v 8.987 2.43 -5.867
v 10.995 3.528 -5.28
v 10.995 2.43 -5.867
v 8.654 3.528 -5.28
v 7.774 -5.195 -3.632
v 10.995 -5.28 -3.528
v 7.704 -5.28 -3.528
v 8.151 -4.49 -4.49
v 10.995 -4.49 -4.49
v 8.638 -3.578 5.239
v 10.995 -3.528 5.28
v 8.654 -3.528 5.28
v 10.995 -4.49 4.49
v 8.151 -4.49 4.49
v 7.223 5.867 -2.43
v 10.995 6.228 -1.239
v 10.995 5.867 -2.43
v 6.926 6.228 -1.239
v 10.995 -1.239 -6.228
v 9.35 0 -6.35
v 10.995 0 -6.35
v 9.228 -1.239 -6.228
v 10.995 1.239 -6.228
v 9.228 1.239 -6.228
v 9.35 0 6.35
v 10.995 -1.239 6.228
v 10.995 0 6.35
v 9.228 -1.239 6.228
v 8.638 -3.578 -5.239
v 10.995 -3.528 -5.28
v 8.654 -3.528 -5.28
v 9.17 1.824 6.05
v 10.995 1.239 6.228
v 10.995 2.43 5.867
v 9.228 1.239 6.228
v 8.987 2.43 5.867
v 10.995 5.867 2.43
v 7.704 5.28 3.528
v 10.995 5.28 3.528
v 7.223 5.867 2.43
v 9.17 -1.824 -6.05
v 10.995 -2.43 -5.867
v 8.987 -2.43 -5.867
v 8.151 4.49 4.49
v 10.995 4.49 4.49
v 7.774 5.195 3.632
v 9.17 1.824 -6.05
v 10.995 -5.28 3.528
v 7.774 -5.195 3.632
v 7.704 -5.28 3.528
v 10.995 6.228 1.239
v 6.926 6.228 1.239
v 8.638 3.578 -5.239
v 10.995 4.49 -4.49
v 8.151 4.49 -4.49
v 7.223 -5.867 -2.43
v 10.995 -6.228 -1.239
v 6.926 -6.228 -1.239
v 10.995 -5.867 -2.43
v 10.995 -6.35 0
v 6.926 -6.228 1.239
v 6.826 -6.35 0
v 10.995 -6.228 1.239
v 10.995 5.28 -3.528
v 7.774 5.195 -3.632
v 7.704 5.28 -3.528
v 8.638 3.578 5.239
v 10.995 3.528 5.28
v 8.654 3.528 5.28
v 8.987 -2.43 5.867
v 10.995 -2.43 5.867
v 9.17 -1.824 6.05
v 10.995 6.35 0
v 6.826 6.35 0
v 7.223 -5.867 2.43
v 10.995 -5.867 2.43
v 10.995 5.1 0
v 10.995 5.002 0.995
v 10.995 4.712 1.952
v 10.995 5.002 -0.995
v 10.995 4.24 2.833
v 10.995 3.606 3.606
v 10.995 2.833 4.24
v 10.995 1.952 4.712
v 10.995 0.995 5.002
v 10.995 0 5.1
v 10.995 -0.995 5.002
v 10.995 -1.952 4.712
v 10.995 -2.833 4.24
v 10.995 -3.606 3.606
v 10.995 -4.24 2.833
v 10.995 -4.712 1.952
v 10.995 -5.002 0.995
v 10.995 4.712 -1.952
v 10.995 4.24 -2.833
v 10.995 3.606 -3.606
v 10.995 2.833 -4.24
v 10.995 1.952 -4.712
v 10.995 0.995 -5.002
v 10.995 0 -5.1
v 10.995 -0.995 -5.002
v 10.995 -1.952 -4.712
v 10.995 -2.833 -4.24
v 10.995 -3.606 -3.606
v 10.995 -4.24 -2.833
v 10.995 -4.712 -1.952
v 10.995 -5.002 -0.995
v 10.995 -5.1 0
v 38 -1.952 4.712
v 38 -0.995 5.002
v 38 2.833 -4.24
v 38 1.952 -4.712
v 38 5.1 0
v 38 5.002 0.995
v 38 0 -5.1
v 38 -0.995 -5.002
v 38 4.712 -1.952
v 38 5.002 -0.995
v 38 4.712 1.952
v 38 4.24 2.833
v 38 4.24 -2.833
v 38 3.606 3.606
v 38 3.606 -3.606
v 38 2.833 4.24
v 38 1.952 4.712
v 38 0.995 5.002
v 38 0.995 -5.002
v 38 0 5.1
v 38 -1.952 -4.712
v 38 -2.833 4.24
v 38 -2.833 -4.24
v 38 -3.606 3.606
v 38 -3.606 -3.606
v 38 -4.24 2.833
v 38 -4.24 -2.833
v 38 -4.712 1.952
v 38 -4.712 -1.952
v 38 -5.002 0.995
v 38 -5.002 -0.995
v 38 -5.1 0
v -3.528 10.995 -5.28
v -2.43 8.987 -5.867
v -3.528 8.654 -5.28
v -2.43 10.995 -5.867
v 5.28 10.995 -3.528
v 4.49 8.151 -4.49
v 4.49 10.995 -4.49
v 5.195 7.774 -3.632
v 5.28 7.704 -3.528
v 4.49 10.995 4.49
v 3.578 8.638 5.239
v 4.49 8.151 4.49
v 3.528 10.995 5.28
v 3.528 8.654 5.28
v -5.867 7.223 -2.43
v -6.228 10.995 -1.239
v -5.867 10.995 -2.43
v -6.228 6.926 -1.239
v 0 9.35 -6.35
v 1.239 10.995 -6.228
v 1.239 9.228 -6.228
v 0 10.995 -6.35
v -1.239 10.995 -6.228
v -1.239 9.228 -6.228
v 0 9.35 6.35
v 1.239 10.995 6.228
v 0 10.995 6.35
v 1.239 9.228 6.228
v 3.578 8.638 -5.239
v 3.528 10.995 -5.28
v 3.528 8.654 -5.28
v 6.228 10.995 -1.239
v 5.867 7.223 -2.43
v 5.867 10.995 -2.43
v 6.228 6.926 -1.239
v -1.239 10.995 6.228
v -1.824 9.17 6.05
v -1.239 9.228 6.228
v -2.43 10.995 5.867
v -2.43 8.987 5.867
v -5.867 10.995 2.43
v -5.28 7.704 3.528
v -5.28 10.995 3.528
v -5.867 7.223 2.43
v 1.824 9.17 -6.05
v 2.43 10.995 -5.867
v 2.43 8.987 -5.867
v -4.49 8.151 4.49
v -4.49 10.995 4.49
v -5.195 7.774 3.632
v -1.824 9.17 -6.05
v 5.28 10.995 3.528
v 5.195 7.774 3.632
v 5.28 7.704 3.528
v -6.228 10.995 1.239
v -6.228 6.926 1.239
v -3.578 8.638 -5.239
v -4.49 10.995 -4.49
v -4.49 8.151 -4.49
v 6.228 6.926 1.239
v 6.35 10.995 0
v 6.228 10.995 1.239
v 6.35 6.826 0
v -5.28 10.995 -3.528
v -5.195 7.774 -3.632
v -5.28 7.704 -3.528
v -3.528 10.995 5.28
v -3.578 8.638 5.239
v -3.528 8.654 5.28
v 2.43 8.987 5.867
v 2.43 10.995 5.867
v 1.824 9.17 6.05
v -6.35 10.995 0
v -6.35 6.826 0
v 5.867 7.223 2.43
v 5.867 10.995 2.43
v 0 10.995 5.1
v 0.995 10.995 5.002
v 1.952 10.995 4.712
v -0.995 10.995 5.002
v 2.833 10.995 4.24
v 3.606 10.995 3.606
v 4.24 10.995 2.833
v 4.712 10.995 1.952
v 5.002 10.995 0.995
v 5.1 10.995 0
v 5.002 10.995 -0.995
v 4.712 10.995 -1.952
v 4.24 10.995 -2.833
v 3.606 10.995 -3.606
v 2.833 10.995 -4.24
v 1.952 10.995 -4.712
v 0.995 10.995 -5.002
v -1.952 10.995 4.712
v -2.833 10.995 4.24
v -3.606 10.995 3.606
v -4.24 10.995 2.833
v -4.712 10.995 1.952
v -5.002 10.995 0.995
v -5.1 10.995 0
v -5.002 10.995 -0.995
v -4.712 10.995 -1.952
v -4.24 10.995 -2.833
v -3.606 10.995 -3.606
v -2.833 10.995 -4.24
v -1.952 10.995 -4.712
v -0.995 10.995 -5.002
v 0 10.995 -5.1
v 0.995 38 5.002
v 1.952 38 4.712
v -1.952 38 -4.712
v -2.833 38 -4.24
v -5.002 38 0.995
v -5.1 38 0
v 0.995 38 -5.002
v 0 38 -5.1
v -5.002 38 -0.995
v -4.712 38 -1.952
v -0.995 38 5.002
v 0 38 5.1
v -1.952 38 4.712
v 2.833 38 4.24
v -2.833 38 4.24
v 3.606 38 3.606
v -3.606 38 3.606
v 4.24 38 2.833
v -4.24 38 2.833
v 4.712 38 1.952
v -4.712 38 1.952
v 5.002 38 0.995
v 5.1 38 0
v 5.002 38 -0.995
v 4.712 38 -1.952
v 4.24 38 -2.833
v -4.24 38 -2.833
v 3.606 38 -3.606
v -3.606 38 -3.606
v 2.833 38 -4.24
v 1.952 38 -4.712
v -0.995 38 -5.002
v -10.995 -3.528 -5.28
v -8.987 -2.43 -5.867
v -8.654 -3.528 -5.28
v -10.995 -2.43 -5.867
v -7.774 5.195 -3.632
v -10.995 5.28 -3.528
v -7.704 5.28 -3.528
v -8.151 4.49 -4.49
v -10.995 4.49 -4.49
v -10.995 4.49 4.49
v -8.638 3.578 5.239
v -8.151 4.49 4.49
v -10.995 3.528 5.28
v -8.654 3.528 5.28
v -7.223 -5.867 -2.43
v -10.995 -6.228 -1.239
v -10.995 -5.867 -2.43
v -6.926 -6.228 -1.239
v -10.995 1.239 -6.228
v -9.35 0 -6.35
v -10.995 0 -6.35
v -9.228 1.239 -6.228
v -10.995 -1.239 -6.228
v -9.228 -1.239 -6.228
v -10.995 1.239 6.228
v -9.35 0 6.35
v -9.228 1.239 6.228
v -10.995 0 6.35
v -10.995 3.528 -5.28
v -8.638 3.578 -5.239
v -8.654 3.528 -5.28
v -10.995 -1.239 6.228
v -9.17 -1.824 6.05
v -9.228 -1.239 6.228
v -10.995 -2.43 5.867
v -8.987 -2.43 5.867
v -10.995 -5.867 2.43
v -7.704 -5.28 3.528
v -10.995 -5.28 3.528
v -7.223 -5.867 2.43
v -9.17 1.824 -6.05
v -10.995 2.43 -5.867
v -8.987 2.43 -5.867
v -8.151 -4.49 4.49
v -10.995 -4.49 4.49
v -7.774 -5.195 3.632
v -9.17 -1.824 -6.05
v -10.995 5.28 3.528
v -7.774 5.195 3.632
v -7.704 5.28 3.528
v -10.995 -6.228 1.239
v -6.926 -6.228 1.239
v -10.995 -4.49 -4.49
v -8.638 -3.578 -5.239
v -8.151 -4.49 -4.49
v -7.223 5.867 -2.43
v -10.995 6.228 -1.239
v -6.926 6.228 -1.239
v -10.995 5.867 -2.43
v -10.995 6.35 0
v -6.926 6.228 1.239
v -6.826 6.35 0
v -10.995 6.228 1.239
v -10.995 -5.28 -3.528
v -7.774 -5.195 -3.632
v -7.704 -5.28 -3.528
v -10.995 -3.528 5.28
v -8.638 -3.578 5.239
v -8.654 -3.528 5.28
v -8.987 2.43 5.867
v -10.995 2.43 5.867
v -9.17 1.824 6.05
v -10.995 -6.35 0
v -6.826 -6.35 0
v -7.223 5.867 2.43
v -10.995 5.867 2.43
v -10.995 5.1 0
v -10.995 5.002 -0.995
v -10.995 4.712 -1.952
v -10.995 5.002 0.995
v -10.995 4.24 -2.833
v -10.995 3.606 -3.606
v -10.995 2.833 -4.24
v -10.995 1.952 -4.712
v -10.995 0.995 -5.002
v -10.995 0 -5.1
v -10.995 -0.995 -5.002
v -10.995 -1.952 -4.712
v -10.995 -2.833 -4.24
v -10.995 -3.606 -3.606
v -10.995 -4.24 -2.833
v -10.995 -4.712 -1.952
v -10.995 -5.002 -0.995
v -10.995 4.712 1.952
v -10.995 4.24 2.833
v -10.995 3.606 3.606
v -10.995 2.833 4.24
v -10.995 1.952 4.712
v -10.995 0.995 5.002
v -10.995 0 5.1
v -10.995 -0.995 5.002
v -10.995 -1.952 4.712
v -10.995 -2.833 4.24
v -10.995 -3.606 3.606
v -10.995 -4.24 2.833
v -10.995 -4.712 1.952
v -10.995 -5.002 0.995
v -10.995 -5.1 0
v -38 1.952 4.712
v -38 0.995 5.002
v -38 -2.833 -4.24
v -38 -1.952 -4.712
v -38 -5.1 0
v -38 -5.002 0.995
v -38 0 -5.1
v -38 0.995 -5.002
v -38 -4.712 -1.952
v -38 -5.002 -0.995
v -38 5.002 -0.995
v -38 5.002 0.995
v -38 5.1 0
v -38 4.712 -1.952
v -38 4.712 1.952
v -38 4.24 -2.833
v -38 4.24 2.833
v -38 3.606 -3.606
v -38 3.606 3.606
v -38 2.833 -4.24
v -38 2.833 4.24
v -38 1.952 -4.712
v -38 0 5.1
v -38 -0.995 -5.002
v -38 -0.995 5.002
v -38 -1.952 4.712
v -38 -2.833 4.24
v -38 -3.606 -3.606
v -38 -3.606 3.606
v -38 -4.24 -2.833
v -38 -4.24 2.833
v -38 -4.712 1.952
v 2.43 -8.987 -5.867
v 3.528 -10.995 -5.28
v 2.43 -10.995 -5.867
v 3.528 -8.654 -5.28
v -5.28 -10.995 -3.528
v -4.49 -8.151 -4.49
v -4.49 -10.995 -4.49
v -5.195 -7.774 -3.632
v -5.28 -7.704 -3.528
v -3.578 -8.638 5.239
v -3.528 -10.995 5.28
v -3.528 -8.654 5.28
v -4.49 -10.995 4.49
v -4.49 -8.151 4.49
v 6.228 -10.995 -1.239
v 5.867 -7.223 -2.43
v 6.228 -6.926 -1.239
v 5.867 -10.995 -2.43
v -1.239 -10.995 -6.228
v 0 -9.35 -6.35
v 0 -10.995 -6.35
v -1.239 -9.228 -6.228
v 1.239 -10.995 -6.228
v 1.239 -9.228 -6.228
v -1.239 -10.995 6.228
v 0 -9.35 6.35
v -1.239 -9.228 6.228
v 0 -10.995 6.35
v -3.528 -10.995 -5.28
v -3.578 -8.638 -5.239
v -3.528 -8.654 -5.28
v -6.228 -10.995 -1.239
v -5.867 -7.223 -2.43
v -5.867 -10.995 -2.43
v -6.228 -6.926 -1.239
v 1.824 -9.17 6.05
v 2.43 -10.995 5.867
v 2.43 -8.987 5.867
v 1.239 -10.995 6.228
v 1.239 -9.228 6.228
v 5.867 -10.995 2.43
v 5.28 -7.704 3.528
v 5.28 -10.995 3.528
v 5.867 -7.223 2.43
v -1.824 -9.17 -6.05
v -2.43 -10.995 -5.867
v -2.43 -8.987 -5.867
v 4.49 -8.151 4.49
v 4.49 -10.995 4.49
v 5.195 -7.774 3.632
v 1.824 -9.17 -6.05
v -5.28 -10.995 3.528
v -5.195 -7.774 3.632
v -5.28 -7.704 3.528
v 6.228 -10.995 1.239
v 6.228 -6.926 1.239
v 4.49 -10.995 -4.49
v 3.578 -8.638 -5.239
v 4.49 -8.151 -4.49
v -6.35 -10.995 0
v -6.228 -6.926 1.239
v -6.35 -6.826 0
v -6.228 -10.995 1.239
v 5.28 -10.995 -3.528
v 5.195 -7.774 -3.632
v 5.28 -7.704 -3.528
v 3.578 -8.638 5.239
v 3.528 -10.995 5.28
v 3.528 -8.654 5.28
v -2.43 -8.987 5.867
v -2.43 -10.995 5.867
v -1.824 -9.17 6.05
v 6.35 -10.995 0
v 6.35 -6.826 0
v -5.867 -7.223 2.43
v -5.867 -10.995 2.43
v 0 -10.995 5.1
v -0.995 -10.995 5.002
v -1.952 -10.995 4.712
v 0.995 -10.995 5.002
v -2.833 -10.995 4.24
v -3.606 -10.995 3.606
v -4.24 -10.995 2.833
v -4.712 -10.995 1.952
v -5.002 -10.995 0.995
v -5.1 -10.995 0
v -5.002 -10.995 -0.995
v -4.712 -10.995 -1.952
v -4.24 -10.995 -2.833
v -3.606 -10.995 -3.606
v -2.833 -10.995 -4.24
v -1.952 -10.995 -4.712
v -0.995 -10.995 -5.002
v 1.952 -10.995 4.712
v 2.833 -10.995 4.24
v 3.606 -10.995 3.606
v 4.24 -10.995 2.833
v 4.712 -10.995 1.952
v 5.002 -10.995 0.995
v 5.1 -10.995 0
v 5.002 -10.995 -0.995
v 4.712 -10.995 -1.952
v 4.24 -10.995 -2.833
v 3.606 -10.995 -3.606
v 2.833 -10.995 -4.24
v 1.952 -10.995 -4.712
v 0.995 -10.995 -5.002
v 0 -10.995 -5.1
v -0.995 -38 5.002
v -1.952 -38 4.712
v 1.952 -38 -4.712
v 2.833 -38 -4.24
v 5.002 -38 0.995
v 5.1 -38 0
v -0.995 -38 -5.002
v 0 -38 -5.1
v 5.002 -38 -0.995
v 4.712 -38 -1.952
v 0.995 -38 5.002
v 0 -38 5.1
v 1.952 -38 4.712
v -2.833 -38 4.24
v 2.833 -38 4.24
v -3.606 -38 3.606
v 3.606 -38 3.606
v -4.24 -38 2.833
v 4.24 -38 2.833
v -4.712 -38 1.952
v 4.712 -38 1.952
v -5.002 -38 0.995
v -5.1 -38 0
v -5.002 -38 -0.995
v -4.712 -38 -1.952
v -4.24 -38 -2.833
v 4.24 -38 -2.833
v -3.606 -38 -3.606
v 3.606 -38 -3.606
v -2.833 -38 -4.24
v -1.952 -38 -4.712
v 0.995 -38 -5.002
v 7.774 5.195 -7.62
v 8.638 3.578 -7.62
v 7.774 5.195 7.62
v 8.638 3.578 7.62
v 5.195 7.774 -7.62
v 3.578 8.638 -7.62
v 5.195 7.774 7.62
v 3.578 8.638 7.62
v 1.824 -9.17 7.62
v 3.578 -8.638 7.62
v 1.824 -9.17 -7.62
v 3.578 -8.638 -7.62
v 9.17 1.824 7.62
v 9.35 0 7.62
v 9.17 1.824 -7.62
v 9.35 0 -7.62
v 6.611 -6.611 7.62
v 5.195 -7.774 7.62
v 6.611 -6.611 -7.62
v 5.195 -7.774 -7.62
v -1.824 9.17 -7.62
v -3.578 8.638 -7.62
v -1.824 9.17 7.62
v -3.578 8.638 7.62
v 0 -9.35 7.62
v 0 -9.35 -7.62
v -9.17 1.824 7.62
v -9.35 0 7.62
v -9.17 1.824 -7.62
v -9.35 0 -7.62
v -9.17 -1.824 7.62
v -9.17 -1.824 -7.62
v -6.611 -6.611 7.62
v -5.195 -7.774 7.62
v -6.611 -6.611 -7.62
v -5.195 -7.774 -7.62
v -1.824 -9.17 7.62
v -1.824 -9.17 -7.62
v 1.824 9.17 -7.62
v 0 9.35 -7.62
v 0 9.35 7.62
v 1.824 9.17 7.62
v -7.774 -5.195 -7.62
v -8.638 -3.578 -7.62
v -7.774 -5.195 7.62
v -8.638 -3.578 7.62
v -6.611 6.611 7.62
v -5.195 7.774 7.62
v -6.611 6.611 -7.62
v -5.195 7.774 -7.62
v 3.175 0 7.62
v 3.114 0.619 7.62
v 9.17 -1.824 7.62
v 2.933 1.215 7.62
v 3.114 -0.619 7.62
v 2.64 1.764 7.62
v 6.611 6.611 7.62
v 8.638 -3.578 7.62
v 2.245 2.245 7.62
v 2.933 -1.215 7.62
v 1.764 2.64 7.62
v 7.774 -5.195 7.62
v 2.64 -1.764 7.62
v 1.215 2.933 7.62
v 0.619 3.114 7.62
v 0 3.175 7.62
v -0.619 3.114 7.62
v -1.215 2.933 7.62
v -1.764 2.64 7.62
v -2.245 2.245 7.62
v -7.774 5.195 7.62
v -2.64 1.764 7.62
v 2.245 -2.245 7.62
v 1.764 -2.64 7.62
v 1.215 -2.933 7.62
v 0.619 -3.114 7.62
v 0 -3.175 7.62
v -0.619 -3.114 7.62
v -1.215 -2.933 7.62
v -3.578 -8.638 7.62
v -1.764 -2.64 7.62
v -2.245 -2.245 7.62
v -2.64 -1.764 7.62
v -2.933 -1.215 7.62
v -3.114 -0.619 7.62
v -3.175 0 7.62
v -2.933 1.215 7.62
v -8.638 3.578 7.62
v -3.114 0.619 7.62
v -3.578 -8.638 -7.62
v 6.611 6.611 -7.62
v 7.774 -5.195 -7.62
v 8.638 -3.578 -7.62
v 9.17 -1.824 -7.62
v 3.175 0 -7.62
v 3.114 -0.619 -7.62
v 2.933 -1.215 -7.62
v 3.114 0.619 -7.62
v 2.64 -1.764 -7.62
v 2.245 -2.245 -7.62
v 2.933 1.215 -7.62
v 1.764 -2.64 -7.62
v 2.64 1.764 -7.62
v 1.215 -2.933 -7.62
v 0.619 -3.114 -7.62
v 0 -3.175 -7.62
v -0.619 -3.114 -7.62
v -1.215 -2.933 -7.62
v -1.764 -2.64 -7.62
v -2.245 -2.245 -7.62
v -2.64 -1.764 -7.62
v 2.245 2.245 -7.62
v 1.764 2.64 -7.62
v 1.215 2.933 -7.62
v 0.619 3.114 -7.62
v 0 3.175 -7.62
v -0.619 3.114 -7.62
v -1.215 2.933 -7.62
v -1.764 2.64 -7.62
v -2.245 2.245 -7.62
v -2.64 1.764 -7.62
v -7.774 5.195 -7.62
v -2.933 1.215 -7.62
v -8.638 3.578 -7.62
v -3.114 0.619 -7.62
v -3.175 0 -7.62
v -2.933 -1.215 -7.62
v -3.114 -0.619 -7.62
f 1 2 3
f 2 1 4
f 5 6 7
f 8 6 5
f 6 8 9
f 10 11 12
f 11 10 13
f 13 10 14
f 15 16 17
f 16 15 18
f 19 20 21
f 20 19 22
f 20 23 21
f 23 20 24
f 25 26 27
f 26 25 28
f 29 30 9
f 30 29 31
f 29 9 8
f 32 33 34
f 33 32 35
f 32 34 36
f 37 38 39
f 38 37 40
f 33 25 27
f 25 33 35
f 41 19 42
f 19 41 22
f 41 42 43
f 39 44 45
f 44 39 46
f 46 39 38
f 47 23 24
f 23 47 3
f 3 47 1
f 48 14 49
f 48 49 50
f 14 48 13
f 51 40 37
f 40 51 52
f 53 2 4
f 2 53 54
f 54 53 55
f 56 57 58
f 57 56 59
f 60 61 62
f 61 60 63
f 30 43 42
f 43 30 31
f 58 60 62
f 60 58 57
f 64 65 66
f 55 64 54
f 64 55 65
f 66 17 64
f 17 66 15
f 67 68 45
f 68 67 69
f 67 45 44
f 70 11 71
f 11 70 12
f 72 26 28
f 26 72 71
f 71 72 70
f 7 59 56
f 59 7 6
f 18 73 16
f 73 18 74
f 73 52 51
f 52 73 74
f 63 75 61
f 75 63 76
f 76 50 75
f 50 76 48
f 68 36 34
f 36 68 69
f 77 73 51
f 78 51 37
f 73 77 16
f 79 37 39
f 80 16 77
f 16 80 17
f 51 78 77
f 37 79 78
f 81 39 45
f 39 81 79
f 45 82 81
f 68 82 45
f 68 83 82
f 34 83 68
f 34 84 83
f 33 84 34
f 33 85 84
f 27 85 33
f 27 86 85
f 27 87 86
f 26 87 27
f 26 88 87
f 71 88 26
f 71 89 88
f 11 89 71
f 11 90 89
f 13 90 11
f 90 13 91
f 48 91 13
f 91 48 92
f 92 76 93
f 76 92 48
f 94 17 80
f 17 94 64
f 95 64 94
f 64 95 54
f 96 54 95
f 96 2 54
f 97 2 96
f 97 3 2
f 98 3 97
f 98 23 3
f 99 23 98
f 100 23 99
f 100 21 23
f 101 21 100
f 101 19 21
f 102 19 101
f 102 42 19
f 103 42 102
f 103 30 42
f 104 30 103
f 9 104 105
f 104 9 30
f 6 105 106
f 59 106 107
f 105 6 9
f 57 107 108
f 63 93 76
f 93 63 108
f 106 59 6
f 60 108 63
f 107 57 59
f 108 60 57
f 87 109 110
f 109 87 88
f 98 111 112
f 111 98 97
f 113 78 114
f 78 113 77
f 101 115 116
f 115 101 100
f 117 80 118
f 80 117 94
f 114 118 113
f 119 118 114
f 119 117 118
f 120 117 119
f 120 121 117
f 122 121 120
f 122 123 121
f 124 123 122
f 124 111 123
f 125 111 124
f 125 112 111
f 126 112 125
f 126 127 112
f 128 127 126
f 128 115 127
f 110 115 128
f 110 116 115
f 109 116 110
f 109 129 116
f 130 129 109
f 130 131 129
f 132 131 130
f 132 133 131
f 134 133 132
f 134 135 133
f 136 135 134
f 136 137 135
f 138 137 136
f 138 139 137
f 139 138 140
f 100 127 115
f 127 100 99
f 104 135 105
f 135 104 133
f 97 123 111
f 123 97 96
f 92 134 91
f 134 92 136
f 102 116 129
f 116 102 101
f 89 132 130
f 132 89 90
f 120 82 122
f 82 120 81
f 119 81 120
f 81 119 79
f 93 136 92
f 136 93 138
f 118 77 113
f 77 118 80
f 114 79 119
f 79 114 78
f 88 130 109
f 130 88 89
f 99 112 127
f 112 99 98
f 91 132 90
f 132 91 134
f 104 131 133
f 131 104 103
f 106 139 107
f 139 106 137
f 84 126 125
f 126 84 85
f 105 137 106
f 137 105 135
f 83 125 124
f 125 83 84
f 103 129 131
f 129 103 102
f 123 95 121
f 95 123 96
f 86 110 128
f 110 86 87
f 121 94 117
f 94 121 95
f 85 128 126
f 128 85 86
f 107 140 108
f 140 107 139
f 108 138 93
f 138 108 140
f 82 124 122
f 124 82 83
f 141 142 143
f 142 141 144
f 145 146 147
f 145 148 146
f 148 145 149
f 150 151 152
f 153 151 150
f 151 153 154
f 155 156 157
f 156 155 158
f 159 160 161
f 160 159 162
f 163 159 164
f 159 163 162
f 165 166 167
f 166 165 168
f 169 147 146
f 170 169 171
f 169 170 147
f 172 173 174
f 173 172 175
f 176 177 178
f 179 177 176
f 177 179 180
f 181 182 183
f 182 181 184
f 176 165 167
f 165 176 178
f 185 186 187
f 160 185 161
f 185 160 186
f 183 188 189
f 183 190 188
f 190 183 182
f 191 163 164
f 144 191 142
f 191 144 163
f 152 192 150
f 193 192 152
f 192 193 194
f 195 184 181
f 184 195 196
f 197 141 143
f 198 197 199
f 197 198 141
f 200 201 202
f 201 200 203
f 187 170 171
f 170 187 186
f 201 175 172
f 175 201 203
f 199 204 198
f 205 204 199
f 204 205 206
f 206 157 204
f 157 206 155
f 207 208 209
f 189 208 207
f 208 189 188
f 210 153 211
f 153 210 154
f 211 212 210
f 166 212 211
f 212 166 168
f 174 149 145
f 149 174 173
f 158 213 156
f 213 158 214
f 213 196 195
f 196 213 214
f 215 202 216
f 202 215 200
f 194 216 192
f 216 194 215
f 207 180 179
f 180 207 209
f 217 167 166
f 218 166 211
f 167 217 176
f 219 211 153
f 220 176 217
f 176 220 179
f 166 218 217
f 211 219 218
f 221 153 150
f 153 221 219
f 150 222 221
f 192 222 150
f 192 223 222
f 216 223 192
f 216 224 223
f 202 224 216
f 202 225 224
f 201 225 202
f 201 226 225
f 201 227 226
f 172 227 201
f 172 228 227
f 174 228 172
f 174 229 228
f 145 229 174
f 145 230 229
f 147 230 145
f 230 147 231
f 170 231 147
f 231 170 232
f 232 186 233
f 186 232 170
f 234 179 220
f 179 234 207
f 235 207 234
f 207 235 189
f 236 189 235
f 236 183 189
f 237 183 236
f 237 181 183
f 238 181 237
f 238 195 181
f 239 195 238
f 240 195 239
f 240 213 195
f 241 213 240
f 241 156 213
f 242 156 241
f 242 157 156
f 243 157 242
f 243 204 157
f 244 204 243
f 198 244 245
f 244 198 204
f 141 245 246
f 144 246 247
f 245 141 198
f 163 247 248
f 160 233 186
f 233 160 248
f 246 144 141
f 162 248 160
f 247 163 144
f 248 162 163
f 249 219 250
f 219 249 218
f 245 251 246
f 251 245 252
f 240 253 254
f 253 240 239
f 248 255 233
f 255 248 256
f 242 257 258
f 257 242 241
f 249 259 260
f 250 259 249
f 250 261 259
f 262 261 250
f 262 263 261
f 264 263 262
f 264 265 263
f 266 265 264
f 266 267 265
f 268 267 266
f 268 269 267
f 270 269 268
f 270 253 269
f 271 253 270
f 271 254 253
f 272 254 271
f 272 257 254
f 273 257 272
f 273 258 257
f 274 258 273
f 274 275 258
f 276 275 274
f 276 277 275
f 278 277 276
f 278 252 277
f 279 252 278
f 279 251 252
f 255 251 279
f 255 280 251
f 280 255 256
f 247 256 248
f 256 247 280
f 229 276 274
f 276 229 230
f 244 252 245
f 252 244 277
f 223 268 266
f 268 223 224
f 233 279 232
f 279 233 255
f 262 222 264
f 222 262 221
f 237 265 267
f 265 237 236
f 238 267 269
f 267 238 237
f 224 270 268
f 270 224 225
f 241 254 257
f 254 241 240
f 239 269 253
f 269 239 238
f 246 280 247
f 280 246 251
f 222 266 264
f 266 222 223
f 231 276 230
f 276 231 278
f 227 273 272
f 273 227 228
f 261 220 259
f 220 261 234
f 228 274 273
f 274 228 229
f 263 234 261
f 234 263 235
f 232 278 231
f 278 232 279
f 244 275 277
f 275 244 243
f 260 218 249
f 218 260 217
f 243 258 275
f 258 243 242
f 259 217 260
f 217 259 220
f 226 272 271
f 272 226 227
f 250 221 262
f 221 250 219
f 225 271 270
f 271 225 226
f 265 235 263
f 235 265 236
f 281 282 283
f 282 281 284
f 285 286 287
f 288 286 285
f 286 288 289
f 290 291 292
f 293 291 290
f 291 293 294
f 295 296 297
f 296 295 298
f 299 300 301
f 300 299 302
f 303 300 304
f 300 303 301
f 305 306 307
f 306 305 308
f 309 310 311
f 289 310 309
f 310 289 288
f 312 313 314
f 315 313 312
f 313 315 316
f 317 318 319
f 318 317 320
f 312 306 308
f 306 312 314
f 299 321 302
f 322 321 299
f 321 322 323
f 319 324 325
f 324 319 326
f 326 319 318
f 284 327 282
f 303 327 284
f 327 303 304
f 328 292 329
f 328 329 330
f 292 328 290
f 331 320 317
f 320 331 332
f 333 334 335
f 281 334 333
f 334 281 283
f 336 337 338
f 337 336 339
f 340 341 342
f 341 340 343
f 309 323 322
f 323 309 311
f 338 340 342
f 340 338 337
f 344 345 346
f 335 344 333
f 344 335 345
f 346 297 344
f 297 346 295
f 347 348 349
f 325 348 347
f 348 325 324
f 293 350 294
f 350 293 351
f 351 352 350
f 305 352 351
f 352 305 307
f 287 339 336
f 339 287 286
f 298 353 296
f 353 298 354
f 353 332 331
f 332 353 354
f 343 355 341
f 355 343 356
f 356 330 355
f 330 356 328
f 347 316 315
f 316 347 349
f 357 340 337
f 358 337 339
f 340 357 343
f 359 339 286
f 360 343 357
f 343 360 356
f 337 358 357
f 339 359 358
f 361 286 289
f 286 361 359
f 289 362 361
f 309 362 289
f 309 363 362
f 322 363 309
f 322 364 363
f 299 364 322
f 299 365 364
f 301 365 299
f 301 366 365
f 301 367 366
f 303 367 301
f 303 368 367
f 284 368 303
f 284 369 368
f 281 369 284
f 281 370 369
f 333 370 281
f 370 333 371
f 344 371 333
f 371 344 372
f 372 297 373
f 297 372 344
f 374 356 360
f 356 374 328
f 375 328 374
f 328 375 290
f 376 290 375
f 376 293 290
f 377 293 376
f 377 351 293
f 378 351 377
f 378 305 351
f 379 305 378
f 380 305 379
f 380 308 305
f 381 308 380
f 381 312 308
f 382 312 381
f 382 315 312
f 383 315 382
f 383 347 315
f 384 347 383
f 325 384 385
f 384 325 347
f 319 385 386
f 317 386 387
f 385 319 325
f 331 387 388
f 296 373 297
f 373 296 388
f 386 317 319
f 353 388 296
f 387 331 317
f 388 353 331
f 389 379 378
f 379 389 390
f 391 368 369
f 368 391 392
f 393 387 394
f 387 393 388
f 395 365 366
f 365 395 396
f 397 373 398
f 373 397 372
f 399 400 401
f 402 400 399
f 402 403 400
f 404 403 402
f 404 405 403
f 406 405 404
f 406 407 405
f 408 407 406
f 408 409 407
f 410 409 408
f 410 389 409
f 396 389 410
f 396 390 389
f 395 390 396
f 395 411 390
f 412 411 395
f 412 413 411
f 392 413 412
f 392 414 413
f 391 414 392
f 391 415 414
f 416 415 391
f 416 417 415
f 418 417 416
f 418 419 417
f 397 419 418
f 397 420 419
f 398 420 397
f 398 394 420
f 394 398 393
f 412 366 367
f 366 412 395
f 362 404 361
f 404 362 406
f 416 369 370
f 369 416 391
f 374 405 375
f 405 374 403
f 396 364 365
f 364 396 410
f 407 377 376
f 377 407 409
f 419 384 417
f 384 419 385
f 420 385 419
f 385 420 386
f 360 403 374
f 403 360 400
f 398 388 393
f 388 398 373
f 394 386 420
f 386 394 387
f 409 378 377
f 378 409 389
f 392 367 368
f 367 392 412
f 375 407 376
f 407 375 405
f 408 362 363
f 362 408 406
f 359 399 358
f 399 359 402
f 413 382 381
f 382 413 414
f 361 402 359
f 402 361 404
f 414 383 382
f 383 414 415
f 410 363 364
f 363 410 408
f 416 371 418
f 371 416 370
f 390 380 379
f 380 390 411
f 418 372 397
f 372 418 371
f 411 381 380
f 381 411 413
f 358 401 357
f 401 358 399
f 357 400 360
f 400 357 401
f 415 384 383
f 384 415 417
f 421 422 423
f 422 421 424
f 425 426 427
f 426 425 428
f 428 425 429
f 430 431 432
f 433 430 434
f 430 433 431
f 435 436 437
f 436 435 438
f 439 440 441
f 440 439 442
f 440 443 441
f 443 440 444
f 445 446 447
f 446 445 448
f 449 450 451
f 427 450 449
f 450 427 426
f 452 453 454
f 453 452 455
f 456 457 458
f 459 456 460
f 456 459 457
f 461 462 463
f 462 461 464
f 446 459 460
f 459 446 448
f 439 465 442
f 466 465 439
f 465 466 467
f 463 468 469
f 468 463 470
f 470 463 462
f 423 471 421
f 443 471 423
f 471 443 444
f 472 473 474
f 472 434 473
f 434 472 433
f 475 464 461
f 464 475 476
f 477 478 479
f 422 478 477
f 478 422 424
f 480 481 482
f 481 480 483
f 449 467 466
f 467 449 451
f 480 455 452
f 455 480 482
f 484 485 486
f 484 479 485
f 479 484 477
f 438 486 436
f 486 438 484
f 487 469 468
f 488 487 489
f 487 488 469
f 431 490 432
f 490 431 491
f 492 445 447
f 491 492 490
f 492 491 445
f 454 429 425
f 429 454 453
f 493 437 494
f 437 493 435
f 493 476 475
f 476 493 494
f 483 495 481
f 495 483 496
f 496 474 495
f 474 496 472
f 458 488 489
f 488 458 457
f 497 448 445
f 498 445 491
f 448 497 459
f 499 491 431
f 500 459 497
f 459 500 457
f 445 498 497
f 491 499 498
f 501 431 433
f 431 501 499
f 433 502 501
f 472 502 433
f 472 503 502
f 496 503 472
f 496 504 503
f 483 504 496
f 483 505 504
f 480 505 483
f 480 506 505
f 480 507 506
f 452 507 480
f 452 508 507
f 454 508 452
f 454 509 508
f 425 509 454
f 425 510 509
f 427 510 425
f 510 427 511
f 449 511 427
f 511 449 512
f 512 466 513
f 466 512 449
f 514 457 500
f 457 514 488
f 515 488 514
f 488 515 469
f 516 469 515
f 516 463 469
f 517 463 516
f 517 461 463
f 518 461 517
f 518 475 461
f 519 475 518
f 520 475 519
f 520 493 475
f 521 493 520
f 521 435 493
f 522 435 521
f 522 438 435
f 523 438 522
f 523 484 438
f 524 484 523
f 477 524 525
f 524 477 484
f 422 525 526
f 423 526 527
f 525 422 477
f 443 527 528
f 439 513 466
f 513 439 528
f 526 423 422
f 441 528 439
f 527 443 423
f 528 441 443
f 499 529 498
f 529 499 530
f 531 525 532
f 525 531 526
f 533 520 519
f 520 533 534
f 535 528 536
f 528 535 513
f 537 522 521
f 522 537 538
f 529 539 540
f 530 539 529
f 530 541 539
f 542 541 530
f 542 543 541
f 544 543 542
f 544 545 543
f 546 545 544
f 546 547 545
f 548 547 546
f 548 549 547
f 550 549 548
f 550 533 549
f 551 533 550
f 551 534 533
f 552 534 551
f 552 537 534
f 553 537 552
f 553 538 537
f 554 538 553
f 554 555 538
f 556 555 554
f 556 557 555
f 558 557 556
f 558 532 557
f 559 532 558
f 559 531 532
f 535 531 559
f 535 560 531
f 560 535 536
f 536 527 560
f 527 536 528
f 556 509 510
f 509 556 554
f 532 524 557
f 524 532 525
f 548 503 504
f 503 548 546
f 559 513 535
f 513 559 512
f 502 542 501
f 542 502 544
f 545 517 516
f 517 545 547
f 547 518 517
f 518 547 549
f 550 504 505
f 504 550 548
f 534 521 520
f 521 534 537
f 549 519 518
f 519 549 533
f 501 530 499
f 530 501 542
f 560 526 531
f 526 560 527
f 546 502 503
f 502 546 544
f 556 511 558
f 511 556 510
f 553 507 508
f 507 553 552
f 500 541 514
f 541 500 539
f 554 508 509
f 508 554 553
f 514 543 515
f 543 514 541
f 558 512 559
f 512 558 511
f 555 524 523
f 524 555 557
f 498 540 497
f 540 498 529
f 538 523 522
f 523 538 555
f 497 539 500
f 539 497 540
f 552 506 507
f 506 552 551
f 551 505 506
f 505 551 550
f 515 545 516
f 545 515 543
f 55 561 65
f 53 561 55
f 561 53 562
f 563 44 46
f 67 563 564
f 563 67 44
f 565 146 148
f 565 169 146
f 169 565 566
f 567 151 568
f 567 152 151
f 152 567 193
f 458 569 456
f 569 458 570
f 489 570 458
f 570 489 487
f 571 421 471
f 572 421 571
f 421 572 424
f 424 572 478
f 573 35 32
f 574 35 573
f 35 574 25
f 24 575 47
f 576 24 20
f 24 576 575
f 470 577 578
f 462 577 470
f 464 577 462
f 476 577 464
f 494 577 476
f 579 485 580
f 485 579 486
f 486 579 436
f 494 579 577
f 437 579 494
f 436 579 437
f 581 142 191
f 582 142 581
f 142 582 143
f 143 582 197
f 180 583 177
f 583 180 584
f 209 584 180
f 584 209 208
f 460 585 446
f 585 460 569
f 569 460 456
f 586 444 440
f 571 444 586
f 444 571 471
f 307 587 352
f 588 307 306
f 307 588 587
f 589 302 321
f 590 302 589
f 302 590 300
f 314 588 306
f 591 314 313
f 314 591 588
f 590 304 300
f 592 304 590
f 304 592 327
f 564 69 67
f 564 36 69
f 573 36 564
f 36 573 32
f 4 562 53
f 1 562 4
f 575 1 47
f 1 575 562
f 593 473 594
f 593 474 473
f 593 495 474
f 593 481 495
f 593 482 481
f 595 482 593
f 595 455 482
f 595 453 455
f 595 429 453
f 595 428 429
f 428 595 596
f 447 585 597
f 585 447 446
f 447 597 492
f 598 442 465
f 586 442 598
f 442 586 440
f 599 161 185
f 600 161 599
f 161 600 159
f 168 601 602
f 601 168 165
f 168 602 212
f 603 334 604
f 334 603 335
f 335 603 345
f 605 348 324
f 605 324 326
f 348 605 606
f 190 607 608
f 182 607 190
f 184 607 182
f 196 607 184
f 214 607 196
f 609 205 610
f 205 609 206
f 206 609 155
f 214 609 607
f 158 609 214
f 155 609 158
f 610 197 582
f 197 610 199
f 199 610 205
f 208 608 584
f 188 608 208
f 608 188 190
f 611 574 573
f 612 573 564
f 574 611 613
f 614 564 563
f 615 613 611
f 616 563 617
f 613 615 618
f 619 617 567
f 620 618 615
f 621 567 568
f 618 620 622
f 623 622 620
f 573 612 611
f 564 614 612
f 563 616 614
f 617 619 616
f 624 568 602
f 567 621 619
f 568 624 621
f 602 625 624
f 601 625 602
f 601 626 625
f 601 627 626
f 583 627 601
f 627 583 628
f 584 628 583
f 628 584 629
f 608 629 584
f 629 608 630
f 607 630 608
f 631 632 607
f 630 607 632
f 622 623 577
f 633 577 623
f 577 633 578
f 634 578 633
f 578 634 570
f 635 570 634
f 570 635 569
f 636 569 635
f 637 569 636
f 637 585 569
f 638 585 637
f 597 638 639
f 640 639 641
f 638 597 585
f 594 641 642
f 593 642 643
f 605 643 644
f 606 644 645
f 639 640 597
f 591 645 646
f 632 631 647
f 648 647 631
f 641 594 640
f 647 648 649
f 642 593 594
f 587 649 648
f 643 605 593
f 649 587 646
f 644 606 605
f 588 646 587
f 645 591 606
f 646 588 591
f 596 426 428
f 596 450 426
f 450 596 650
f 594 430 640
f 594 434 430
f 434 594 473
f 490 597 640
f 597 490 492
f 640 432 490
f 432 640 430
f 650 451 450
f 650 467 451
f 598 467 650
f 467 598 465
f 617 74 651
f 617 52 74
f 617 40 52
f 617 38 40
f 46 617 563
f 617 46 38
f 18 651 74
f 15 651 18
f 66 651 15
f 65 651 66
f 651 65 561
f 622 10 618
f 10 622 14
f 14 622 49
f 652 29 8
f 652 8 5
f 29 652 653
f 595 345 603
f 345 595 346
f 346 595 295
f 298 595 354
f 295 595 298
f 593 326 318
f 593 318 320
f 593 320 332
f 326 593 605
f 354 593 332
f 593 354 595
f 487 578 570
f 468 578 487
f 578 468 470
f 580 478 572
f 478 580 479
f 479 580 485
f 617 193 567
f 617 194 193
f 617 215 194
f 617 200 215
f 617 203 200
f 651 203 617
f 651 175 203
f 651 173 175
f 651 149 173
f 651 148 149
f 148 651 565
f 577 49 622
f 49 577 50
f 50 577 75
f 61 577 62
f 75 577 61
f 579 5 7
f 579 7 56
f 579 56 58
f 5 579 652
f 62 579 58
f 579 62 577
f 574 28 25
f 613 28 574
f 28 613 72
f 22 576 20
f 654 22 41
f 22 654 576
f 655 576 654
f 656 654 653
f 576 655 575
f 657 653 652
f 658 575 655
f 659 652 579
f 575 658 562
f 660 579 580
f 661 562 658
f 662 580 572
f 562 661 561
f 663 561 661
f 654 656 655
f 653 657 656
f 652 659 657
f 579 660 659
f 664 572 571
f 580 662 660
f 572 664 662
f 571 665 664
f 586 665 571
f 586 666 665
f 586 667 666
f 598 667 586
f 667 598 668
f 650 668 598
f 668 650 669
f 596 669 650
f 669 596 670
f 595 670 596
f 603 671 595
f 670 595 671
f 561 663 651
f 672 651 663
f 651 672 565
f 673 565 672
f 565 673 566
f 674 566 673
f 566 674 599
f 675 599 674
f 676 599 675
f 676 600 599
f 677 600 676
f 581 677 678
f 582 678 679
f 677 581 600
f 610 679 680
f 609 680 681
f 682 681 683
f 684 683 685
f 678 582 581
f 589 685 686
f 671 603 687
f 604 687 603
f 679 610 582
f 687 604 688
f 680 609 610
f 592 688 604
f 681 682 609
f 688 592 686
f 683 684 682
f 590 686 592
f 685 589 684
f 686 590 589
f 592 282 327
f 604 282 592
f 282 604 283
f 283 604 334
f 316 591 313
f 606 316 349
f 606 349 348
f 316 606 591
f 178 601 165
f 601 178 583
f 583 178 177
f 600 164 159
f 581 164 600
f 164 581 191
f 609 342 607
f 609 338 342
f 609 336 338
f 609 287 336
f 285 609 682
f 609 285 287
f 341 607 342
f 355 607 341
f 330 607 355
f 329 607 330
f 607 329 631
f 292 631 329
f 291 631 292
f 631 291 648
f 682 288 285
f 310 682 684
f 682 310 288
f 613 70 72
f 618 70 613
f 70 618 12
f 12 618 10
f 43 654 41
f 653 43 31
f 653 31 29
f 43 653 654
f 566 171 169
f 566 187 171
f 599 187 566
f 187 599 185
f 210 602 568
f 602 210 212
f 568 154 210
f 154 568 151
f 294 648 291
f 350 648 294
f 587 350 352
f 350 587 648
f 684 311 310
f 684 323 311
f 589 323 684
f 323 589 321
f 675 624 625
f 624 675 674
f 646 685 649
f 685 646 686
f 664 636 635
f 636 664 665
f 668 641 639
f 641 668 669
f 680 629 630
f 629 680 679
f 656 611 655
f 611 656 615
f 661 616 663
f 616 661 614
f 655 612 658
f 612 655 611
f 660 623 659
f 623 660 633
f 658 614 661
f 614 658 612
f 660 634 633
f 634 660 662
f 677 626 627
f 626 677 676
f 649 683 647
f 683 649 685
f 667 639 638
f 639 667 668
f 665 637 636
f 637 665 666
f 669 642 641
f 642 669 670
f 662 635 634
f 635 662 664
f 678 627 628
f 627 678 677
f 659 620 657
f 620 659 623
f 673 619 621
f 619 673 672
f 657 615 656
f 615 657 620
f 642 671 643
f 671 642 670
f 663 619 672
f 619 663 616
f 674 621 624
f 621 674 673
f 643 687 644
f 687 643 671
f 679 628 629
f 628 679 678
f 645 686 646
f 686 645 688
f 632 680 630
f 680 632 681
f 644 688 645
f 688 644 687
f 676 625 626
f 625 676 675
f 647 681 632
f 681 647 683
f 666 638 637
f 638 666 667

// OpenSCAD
$fn = 32;

// ----------------------------------------------------------------------
// Cardan cross: 76 mm span, 12.7 mm trunnions
// ----------------------------------------------------------------------

// --- parameters (mm) ---
journal_d = 12.7;         // trunnion diameter
arm_len = 38;             // trunnion length from the centre
step_r = 4.32;            // step position from the centre
step_d = 10.2;            // journal diameter after the step
hub_d = 18.7;             // hub diameter
hub_h = 15.24;            // hub height
bore_d = 6.35;            // hub bore

difference() {
  union() {
    /* hub along the joint axis */
    cylinder(h = hub_h, d = hub_d, center = true);
    for (a = [0 : 90 : 270]) rotate([0, 0, a]) {
      /* trunnion, sunk into the hub */
      translate([hub_d / 4, 0, 0]) rotate([0, 90, 0]) cylinder(h = step_r + 2, d = journal_d);
      /* stepped journal out to the tip */
      translate([step_r - 0.5, 0, 0]) rotate([0, 90, 0]) cylinder(h = arm_len + 0.5 - step_r, d = step_d);
    }
  }
  /* lubrication bore through the hub, 2.5 mm clear on both sides */
  translate([0, 0, -hub_h / 2 - 2.5]) cylinder(h = hub_h + 5, d = bore_d);
}
